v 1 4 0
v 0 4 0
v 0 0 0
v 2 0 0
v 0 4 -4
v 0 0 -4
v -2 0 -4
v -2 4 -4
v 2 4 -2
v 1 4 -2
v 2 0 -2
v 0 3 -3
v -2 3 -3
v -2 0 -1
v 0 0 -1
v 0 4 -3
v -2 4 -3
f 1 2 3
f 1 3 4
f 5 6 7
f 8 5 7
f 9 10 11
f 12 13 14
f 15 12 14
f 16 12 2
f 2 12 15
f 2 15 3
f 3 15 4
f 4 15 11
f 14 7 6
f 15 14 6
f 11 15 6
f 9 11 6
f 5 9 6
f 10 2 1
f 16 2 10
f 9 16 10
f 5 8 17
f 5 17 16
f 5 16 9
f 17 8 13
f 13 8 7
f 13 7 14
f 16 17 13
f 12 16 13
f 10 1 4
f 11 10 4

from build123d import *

# Parameters (mm, degrees)
BOSS_EXTRUDE1_DEPTH = 4
CUT_EXTRUDE2_DEPTH  = 2
CUT_EXTRUDE3_DEPTH  = 2


with BuildPart() as part:
    # Sketch1 → Boss-Extrude1 (new body)
    with BuildSketch(Plane(origin=(0, 0, 0), x_dir=(1, 0, 0), z_dir=(0, 1, 0))):
        Polygon((0, 0), (2, 0), (2, 2), (0, 4), (-2, 4), (-2, 1), (0, 1), align=None)
    extrude(amount=BOSS_EXTRUDE1_DEPTH)

    # Sketch3 → Cut-Extrude2 (cut)
    with BuildSketch(Plane.XY):
        Polygon((1, 4), (2, 0), (2, 4), align=None)
    extrude(amount=-CUT_EXTRUDE2_DEPTH, mode=Mode.SUBTRACT)

    # Sketch4 → Cut-Extrude3 (cut)
    with BuildSketch(Plane.ZY.offset(2)):
        Polygon((-1, 4), (-3, 4), (-3, 3), (-1, 0), align=None)
    extrude(amount=-CUT_EXTRUDE3_DEPTH, mode=Mode.SUBTRACT)


solid = part.part
